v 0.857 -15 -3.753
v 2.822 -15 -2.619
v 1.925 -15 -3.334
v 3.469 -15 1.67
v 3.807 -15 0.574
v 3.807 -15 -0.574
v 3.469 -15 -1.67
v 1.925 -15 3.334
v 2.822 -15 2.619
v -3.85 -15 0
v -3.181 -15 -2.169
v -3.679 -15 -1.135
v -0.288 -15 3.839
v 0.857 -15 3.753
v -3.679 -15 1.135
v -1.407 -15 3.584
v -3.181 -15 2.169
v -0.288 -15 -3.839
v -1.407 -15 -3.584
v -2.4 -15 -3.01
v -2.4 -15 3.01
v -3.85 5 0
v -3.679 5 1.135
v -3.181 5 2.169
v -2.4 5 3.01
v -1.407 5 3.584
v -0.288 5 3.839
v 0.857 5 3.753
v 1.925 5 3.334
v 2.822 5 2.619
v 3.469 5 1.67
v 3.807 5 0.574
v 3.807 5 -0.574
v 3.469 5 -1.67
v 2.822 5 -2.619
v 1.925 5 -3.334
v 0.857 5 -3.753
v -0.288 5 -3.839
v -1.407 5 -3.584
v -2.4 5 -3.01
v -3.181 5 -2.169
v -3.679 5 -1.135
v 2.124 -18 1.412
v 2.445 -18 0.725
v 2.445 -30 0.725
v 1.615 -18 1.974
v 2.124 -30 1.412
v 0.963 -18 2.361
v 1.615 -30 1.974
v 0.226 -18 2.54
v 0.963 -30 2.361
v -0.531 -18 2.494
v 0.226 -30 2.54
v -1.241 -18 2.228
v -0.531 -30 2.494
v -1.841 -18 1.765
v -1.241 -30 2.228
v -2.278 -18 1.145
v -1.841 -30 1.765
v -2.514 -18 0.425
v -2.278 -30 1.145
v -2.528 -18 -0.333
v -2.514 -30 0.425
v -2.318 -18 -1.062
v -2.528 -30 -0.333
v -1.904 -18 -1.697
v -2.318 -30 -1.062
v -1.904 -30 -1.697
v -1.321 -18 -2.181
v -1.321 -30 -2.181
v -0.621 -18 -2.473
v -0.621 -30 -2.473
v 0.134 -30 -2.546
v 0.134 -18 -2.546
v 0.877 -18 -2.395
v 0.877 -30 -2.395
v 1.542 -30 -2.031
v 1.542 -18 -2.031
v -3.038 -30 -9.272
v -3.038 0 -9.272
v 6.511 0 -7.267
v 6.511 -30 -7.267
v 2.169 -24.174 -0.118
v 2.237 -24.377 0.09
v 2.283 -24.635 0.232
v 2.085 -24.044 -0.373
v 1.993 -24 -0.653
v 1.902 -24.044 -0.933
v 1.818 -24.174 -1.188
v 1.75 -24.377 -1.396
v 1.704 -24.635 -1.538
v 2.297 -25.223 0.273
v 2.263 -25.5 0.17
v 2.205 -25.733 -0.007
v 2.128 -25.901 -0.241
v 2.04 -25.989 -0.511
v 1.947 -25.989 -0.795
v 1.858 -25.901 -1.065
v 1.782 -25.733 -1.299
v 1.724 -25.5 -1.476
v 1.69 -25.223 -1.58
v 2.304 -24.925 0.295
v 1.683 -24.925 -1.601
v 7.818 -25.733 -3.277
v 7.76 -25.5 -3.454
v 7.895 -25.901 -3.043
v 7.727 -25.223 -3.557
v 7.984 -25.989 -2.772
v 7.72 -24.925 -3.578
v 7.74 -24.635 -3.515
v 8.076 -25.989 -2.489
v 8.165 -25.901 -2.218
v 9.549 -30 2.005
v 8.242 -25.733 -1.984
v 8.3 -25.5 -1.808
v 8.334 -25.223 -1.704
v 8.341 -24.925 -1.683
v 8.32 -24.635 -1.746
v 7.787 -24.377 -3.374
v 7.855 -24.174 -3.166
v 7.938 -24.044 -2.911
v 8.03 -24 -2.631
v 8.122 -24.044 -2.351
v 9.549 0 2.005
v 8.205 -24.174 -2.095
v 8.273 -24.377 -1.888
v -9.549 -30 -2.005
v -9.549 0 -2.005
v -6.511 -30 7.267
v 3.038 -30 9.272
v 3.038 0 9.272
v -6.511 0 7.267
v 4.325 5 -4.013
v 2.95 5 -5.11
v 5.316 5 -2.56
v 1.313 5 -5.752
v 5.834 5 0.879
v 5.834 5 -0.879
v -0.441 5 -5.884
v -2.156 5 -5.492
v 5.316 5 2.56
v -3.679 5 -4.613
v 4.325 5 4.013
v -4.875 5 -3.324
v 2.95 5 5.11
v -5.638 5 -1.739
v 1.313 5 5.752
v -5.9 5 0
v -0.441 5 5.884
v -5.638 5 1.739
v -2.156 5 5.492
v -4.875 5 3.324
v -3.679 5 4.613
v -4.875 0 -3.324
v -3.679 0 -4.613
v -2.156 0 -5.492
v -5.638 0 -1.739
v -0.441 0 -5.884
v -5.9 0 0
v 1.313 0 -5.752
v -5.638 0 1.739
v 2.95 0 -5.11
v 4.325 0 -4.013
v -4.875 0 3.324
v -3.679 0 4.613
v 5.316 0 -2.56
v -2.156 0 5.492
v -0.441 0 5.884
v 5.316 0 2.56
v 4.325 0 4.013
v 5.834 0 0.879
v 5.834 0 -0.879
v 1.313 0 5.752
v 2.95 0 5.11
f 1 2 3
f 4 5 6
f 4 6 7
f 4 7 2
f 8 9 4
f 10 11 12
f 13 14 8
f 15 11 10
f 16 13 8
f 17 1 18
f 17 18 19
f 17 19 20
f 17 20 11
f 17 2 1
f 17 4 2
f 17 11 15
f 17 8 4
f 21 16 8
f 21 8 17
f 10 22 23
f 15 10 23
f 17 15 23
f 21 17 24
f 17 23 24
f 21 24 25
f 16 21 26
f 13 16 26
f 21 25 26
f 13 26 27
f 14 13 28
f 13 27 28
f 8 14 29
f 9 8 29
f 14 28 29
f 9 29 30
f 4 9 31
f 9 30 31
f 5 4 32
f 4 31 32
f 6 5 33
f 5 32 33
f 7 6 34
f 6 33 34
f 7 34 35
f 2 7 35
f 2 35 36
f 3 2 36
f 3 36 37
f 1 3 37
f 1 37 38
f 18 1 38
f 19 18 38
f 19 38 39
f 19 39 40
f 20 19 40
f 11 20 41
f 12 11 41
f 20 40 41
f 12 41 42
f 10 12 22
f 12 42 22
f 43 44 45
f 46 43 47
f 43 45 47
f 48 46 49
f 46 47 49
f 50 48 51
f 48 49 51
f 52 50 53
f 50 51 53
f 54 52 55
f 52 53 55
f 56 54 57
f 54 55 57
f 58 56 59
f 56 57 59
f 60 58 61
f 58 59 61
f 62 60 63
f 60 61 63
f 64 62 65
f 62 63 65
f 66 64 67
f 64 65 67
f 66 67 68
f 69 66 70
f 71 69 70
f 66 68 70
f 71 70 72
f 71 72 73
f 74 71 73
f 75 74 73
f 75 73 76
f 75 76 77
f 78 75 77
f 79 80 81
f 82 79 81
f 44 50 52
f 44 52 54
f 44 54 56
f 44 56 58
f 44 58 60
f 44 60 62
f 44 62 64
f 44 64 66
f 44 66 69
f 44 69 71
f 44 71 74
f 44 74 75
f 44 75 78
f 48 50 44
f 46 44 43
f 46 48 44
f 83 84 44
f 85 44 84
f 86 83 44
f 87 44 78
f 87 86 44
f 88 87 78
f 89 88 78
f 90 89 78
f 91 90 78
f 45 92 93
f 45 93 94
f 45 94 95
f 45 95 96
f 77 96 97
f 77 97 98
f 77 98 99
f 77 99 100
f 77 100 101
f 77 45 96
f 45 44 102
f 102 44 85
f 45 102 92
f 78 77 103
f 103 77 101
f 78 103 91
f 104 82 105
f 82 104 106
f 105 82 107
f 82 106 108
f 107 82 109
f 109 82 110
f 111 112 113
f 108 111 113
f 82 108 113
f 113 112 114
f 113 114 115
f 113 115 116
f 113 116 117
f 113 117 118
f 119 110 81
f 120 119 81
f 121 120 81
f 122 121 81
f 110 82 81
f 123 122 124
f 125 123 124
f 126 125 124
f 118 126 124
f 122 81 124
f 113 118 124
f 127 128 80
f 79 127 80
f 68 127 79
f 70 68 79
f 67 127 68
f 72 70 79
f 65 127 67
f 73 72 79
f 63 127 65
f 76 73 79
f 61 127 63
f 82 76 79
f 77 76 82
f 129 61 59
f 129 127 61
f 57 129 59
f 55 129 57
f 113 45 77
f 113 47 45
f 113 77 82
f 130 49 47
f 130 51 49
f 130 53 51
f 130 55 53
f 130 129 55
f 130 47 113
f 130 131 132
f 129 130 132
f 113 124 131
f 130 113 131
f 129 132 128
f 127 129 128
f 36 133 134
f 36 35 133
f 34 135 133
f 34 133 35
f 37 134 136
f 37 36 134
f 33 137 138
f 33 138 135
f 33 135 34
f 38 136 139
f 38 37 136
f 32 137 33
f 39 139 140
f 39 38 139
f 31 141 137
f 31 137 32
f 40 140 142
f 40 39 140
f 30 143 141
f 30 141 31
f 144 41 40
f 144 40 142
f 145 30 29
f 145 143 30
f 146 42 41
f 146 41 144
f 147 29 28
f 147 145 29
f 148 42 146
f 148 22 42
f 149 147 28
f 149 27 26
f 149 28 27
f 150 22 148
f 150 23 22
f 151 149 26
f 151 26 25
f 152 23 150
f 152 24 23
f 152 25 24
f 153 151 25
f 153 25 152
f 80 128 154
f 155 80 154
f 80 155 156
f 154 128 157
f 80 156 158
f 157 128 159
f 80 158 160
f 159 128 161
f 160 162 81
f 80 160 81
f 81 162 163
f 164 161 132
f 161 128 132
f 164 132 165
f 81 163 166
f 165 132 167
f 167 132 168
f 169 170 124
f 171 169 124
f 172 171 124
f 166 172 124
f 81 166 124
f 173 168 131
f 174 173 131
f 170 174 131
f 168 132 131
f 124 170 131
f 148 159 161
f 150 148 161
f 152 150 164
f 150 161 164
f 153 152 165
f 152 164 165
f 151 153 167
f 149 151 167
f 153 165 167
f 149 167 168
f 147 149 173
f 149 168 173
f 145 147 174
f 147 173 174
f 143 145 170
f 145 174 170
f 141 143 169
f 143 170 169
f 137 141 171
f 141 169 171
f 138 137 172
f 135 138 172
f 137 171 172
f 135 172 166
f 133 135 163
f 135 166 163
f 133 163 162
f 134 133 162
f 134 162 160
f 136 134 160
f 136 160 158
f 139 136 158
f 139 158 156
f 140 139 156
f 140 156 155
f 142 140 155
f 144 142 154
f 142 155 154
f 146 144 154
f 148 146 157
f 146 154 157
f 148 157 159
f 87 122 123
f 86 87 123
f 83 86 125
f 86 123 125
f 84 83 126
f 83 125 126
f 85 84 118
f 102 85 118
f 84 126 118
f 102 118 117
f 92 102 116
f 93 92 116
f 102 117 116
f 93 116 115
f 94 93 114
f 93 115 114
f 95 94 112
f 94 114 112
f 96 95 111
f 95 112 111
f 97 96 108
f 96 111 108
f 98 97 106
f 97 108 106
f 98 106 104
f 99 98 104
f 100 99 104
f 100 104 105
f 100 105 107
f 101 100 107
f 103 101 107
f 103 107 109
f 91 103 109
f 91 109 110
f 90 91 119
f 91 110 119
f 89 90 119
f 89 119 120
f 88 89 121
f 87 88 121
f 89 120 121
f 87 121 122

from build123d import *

# Parameters (mm, degrees)
F1_DEPTH  = 30
F2_R      = 5.9
F3_DEPTH  = 5
F4_R      = 3.85
F5_DEPTH  = 20
F6_R      = 2.55
F7_DEPTH  = 12
F9_DEPTH  = 15
F10_R     = 1
F11_DEPTH = 6.3523823037


with BuildPart() as f1:
    # F0 (on Front) → F1 (new body)
    with BuildSketch(Plane.XZ):
        Polygon((6.5112455915, -7.2668434812), (9.5488938558, 2.0054823519), (3.0376482643, 9.2723258331), (-6.5112455915, 7.2668434812), (-9.5488938558, -2.0054823519), (-3.0376482643, -9.2723258331), align=None)
    extrude(amount=F1_DEPTH)

    # F2 (on face) → F3 (join)
    with BuildSketch(Plane(origin=(0, 0, 0), x_dir=(-1, 0, 0), z_dir=(0, 1, 0))):
        Circle(F2_R)
    extrude(amount=F3_DEPTH)

    # F4 (on face) → F5 (cut)
    with BuildSketch(Plane(origin=(0, 5, 0), x_dir=(-1, 0, 0), z_dir=(0, 1, 0))):
        Circle(F4_R)
    extrude(amount=-F5_DEPTH, mode=Mode.SUBTRACT)

    # F6 (on face) → F7 (cut)
    with BuildSketch(Plane.XZ.offset(30)):
        Circle(F6_R)
    extrude(amount=-F7_DEPTH, mode=Mode.SUBTRACT)

    # F8 (on face) → F9 (join, through all)
    with BuildSketch(Plane.XZ.offset(30)):
        with BuildLine():
            Line((2.444793275, 0.7249040229), (1.5419561582, -2.0309778941))
            ThreePointArc((1.5419561582, -2.0309778941), (2.2841287402, -1.1336912712), (2.55, 0))
            ThreePointArc((2.55, 0), (2.5235612585, 0.3662493336), (2.444793275, 0.7249040229))
        make_face()
    extrude(amount=-F9_DEPTH)

    # F10 (on face) → F11 (cut, through all)
    with BuildSketch(Plane(origin=(8.0300697237, 0, -2.6306805646), x_dir=(0, 1, 0), z_dir=(0.9503041093, 0, -0.3113231437))):
        with Locations((-25, 0)):
            Circle(F10_R)
    extrude(amount=-F11_DEPTH, mode=Mode.SUBTRACT)


solid = f1.part
